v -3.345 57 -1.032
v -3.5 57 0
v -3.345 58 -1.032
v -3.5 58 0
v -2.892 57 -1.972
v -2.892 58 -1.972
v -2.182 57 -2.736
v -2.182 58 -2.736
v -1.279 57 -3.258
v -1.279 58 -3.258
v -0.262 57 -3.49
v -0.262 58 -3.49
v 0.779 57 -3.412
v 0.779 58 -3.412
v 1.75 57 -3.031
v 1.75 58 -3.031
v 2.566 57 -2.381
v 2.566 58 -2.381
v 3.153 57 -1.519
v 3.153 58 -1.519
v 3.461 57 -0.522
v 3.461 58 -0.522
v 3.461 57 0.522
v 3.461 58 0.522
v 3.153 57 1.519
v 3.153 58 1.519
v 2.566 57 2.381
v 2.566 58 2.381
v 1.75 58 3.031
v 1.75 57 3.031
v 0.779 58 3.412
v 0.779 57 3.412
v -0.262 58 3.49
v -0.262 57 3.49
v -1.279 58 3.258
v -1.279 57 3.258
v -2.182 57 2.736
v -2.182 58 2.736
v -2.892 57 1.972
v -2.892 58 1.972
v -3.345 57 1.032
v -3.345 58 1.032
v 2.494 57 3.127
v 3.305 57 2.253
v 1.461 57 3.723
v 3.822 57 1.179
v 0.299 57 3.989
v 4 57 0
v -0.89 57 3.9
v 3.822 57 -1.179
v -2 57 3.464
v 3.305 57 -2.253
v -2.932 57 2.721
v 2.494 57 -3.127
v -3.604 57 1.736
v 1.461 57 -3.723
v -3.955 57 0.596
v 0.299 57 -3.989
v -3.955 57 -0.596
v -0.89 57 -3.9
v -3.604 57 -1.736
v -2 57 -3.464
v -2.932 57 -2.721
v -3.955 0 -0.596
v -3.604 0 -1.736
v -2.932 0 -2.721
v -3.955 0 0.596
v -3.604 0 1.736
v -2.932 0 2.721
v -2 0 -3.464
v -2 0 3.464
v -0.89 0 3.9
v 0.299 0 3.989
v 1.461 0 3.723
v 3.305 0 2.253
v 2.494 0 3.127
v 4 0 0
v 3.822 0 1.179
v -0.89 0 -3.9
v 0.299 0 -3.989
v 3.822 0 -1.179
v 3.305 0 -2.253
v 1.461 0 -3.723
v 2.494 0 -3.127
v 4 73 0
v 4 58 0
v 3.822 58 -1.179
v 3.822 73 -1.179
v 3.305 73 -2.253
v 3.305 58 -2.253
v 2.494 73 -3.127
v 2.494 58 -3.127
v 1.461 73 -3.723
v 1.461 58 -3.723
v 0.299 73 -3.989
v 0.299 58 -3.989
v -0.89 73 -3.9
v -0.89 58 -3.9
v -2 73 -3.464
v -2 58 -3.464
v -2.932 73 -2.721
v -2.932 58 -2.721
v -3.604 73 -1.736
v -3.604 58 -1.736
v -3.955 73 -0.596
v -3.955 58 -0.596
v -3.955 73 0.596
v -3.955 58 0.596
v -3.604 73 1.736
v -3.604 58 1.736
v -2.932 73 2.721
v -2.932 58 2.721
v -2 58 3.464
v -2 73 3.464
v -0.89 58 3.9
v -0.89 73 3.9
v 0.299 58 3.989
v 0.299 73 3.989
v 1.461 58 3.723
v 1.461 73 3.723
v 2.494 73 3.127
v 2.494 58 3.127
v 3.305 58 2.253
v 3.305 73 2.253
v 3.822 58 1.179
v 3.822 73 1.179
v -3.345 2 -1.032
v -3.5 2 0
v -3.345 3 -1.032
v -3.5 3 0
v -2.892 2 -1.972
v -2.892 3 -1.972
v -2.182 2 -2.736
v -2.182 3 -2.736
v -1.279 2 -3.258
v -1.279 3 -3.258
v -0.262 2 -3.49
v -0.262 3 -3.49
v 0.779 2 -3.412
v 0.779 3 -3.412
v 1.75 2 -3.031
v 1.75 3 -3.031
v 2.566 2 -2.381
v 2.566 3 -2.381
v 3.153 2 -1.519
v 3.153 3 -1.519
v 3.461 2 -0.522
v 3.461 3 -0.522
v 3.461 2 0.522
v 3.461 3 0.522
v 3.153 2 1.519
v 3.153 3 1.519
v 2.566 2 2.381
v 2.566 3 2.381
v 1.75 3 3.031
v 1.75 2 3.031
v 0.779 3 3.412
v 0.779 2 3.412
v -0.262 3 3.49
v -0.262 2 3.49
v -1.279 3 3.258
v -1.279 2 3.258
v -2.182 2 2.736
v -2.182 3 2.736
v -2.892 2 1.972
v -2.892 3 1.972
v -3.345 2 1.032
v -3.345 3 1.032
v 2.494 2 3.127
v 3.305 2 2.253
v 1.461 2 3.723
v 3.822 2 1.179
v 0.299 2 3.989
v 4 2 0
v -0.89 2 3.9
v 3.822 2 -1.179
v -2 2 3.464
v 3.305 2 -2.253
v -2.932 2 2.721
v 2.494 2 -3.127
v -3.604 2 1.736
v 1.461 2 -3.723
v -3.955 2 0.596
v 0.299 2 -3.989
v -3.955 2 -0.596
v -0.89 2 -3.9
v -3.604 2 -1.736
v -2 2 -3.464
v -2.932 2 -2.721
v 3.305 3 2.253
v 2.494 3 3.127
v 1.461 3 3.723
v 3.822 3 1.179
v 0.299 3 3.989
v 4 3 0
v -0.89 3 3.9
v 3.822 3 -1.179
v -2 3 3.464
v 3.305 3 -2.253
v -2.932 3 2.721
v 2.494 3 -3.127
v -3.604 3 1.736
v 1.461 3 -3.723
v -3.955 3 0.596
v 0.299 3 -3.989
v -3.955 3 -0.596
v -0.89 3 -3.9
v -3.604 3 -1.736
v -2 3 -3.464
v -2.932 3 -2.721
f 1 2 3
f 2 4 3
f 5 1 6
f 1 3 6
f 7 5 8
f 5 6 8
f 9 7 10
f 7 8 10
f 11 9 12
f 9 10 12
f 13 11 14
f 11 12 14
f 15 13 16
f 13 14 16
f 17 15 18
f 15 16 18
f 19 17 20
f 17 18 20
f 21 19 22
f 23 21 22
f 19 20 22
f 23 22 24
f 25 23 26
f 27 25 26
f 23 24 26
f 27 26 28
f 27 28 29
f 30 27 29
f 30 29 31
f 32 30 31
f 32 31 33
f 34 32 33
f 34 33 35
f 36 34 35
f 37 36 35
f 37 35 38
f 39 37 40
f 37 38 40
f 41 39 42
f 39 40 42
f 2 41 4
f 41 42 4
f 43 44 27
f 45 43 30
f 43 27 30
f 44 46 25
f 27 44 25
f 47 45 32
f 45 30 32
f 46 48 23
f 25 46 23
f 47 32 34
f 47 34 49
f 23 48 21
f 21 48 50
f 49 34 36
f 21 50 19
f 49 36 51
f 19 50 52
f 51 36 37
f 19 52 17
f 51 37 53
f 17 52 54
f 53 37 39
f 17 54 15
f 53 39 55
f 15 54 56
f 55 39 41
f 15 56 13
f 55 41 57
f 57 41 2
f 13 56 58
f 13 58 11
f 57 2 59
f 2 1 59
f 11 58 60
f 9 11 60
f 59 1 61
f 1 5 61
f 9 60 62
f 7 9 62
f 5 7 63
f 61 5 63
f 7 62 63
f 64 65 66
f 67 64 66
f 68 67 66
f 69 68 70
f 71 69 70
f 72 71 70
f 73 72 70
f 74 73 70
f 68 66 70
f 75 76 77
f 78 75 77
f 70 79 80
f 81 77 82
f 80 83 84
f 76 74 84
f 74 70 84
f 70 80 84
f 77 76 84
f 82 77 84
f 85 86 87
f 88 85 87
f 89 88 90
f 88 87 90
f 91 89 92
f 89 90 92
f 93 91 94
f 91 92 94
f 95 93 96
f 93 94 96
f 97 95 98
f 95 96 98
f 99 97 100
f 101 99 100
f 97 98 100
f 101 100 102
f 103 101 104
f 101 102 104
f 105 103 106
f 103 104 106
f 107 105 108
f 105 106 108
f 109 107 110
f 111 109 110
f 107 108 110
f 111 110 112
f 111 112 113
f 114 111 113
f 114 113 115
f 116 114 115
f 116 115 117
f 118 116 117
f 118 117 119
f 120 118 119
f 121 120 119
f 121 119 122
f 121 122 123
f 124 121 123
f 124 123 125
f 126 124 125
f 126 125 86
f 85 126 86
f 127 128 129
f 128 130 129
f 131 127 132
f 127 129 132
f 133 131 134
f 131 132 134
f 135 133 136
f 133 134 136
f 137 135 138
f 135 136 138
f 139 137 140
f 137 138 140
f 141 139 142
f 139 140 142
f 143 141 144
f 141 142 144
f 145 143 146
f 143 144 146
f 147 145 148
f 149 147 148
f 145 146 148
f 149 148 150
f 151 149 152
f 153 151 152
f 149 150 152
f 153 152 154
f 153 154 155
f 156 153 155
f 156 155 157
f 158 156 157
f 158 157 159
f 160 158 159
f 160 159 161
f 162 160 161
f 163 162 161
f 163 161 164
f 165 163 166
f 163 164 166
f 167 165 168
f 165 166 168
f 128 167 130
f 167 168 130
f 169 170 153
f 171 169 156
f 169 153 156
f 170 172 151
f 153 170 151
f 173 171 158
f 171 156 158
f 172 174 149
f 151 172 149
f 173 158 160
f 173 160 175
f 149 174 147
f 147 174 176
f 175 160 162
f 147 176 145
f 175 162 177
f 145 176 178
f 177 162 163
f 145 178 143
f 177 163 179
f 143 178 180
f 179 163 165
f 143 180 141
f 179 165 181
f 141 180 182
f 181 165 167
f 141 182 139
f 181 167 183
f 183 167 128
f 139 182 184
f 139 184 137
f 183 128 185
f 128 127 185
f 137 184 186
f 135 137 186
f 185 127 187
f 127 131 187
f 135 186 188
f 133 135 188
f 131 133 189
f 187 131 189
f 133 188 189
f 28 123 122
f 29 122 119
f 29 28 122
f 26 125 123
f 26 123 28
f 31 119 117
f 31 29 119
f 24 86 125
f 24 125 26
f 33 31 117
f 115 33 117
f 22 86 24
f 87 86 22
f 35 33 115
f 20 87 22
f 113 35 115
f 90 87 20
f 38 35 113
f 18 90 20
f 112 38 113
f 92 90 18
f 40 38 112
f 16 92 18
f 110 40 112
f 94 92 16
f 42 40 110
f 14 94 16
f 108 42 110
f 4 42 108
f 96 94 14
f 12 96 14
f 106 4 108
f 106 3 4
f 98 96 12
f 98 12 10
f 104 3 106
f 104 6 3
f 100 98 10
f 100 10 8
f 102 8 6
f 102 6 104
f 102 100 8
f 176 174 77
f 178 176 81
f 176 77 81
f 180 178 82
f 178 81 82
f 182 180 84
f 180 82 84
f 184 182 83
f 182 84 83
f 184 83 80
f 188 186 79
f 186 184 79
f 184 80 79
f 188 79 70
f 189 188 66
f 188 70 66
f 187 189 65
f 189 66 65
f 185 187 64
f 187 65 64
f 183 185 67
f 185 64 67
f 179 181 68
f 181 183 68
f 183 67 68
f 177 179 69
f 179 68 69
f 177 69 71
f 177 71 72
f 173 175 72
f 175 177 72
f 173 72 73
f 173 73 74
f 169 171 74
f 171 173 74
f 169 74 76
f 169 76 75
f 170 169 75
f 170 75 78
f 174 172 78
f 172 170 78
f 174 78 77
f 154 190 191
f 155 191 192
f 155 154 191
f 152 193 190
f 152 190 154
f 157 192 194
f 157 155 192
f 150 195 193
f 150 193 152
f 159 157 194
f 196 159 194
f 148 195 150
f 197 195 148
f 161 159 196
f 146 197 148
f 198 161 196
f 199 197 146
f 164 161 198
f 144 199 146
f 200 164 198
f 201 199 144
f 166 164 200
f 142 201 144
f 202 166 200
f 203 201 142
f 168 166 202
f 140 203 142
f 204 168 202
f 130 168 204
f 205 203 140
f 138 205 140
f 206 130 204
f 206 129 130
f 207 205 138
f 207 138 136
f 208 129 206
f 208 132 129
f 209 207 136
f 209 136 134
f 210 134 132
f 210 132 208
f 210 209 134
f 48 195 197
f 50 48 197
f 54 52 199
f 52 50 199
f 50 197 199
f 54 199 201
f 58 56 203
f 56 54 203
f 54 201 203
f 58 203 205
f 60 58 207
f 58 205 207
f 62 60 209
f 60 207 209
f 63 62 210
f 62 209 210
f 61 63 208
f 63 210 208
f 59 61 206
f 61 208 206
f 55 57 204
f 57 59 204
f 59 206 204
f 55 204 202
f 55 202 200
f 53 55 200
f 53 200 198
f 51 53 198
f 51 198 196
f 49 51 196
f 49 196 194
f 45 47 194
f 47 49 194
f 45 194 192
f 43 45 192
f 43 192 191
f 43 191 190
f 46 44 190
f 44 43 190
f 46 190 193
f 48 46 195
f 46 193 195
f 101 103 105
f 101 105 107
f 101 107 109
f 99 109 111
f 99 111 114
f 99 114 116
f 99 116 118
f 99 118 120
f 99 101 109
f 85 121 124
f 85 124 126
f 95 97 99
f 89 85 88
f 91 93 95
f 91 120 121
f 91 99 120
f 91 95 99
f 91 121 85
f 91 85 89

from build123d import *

# Parameters (mm, degrees)
SKETCH1_R           = 4
BOSS_EXTRUDE1_DEPTH = 73
SKETCH2_W           = 0.5
SKETCH2_H           = 1


with BuildPart() as part:
    # Sketch1 → Boss-Extrude1 (new body)
    with BuildSketch(Plane(origin=(0, 0, 0), x_dir=(1, 0, 0), z_dir=(0, 1, 0))):
        Circle(SKETCH1_R)
    extrude(amount=BOSS_EXTRUDE1_DEPTH)

    # Sketch2 → Cut-Revolve1 (revolve, cut)
    with BuildSketch(Plane.XY):
        with Locations((-3.75, 57.5)):
            Rectangle(SKETCH2_W, SKETCH2_H)
        with Locations((-3.75, 2.5)):
            Rectangle(SKETCH2_W, SKETCH2_H)
    revolve(axis=Axis((0, 73, 0), (0, -1, 0)), mode=Mode.SUBTRACT)


solid = part.part
